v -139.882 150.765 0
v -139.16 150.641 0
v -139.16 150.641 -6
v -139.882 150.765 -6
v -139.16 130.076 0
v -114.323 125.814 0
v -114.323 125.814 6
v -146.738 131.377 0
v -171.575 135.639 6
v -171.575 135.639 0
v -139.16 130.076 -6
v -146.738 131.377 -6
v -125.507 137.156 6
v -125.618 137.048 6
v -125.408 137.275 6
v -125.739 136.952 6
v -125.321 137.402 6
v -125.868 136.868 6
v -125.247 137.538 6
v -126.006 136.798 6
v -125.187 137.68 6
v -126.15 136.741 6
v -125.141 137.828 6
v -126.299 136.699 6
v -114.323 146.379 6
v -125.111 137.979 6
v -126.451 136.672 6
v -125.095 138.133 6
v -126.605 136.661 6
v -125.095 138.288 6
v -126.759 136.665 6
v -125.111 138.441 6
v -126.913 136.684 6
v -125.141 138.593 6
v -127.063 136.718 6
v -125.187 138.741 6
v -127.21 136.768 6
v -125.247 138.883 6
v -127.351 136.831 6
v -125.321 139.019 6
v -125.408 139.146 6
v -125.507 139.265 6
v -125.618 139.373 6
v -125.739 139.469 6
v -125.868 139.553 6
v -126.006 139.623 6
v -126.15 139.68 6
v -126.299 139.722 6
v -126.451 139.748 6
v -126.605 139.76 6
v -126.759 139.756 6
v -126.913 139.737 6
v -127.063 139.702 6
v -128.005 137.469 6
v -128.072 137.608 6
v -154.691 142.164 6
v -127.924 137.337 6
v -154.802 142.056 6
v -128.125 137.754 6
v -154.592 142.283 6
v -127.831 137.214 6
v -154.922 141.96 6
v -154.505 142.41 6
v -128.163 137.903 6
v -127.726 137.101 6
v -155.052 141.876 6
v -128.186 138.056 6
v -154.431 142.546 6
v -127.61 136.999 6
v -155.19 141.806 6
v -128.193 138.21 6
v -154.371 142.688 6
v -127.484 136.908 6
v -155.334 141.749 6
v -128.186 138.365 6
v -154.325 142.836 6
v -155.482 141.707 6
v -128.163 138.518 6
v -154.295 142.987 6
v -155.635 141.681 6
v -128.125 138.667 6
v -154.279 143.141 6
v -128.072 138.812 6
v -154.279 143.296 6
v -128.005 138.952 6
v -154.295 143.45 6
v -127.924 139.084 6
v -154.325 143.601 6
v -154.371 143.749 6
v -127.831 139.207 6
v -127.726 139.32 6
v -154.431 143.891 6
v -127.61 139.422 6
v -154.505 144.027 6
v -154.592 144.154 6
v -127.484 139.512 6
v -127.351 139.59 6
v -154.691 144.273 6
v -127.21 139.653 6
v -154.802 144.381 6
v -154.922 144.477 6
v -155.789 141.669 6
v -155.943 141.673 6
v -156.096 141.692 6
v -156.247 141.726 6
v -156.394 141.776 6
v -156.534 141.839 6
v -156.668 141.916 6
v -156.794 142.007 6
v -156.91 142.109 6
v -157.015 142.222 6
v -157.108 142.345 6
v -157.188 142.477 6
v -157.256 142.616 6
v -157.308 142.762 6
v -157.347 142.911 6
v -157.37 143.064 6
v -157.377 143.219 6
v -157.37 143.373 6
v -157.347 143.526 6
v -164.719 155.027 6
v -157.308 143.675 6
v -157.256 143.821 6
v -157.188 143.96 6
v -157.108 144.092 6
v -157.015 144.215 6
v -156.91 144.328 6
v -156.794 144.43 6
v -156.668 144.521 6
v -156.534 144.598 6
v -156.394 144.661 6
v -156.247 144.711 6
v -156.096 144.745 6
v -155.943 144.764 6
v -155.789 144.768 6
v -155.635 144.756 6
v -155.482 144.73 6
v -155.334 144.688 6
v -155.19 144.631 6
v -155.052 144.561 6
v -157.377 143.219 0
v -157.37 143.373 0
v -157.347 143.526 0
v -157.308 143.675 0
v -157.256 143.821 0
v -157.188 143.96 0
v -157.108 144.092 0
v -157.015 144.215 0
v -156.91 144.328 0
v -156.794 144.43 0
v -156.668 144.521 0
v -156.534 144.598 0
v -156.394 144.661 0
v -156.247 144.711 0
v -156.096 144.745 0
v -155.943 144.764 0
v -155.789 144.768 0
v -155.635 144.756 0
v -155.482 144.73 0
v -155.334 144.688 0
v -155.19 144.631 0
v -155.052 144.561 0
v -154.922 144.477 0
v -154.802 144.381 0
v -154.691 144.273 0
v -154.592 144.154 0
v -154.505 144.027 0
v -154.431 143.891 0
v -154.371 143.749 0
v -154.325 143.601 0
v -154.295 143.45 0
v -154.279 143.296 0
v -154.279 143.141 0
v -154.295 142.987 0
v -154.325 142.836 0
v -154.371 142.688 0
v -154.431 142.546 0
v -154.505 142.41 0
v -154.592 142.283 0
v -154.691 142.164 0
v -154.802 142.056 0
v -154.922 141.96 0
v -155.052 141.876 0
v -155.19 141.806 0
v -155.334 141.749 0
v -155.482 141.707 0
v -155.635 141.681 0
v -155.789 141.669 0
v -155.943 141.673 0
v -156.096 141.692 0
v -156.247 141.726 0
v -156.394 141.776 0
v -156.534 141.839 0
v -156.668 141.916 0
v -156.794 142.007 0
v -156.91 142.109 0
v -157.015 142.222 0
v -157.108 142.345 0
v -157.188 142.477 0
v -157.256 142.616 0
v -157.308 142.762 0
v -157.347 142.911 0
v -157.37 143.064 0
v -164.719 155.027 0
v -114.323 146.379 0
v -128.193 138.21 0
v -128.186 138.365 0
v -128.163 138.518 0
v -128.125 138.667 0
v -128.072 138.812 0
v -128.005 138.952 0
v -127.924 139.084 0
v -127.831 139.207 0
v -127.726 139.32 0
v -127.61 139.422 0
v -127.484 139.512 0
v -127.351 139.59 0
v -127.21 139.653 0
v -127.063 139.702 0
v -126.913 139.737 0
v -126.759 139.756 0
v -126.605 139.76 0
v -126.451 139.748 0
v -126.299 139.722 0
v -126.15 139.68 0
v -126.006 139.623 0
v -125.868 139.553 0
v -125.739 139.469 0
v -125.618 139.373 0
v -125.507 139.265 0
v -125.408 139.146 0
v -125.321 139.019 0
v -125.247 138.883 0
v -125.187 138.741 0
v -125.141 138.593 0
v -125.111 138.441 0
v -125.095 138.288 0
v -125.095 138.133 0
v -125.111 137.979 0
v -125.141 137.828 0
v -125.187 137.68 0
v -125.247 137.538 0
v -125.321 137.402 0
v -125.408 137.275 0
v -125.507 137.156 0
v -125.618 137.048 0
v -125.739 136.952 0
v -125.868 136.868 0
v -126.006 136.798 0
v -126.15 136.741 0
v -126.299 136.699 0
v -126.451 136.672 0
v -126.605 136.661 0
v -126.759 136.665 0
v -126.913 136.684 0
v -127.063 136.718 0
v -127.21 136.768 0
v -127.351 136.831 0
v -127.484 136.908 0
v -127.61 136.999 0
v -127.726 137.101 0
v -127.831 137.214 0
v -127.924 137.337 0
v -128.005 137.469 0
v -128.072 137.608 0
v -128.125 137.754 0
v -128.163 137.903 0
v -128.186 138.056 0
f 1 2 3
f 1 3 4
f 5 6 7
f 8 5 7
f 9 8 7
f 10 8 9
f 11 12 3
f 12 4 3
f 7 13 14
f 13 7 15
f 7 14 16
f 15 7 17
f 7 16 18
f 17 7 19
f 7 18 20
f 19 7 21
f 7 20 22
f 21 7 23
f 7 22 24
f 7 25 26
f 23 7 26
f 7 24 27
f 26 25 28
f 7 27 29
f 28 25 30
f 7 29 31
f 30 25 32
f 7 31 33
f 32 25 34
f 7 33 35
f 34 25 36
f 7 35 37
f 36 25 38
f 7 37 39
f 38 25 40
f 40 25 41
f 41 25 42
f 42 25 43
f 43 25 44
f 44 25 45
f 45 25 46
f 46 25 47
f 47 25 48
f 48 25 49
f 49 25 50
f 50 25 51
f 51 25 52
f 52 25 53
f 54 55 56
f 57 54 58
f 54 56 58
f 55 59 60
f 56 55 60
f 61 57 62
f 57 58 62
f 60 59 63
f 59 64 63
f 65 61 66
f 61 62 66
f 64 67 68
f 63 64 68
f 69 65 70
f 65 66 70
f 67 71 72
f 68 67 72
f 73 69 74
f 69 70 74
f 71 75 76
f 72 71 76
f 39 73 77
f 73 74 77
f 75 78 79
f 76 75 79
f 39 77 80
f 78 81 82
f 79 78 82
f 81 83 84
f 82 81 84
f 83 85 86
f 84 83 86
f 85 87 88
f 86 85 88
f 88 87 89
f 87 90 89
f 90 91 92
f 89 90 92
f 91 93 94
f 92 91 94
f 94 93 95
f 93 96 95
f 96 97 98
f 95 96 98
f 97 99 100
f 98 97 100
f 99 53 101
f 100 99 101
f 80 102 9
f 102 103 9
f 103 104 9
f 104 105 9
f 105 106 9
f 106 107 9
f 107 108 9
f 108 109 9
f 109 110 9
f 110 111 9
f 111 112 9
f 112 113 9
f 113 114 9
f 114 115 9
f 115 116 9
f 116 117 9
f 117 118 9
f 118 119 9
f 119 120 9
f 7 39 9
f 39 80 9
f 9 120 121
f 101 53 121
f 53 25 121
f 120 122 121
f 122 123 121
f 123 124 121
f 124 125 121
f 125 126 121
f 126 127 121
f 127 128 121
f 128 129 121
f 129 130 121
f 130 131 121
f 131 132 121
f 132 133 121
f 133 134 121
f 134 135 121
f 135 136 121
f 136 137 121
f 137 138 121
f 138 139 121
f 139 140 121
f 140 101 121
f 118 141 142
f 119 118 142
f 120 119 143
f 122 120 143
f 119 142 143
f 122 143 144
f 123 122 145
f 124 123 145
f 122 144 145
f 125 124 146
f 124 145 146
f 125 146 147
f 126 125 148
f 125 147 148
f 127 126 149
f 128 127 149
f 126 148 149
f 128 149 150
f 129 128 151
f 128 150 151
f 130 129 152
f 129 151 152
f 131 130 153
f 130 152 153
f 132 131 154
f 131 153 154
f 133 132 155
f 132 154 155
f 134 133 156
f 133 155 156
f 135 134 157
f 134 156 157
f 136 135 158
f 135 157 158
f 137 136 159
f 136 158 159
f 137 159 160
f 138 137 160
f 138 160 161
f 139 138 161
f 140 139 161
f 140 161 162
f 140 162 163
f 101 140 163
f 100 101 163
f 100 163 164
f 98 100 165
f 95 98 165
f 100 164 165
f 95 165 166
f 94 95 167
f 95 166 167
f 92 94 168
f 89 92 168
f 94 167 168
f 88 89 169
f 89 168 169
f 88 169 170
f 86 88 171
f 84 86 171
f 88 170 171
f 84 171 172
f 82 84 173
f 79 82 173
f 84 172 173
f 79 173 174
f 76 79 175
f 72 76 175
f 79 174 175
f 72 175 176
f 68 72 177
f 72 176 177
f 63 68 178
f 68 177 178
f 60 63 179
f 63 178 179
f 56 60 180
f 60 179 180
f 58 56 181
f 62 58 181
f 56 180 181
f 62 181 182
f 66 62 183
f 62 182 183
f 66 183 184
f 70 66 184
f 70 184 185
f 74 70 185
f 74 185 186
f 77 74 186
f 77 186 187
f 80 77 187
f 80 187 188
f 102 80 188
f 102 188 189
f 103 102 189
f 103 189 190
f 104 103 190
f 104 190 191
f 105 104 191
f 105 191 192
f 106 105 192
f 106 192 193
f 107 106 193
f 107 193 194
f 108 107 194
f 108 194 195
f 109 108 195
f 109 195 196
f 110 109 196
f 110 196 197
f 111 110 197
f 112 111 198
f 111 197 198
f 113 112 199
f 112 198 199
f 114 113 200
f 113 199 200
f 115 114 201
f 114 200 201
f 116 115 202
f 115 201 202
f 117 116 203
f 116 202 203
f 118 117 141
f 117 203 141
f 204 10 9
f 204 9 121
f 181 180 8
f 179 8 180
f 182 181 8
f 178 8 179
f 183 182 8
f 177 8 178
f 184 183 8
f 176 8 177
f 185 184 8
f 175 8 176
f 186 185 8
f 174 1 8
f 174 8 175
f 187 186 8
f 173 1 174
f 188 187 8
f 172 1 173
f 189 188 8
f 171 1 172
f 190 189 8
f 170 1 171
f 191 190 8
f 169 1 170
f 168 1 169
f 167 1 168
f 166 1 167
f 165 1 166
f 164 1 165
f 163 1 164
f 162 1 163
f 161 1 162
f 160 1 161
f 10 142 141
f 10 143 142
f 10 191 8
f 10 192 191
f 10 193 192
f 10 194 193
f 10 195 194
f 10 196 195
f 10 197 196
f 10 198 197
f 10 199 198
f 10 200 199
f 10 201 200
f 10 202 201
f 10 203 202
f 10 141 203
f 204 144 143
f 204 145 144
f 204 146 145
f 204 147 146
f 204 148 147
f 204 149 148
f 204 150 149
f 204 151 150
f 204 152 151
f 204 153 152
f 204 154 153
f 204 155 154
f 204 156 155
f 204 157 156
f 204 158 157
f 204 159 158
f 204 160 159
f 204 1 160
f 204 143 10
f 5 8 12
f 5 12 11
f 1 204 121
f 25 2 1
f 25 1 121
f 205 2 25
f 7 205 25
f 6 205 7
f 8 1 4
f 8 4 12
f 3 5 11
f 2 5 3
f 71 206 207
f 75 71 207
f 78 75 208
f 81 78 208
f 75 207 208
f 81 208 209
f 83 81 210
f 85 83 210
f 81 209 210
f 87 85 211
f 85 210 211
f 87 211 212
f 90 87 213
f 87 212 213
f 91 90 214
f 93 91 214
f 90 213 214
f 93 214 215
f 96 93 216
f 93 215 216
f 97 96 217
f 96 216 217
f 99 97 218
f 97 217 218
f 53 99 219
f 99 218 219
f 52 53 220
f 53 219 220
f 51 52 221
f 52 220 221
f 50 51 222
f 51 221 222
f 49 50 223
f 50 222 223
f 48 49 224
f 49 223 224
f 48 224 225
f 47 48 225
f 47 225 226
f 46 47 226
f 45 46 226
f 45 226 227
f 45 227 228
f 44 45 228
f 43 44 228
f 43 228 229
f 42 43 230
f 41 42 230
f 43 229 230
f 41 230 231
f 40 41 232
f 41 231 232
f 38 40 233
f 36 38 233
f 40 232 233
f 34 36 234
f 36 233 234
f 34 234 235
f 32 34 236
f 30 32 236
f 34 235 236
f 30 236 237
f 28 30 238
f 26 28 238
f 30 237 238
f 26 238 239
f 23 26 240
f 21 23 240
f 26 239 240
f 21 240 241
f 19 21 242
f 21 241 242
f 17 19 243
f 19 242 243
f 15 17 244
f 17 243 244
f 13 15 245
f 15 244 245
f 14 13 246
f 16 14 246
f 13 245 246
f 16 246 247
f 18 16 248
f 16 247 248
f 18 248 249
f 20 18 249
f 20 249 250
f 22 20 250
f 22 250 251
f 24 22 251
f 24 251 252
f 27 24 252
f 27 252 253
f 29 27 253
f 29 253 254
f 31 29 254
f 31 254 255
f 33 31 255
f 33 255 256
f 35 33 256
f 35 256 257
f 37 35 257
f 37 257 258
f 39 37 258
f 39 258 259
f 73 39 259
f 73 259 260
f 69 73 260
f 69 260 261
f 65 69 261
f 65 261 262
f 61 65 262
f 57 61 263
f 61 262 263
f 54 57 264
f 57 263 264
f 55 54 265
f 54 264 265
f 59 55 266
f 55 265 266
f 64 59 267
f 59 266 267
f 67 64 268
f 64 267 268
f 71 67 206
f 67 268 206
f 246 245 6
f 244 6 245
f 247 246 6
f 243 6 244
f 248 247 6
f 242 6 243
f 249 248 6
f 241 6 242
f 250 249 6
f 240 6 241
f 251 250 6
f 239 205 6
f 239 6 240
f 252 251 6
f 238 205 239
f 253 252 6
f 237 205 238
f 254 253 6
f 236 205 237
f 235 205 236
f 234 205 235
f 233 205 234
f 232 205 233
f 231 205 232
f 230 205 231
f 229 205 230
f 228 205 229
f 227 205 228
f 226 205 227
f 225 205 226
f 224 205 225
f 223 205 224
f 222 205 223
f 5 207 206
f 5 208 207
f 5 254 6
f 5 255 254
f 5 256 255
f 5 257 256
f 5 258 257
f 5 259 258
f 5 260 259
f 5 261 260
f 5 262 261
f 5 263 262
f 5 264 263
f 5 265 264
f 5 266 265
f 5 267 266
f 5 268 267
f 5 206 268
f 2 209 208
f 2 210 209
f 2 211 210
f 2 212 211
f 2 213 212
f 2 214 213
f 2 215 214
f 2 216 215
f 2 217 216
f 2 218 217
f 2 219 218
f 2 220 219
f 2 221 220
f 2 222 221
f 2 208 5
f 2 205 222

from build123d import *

# Parameters (mm, degrees)
EXTRUDE_1_DEPTH     = 6
EXTRUDE_2_DEPTH     = 6
SKETCH_3_R          = 1.55
CUT_EXTRUDE_1_DEPTH = 6


with BuildPart() as part:
    # Эскиз1 → Бобышка-Вытянуть1 (new body)
    with BuildSketch(Plane.XY):
        Polygon((-114.323496858, 125.813994573), (-171.575189585, 135.638663443), (-164.719145048, 155.026651824), (-114.323496858, 146.378513535), align=None)
    extrude(amount=EXTRUDE_1_DEPTH)

    # Эскиз2 → Бобышка-Вытянуть2 (add)
    with BuildSketch(Plane(origin=(0, 0, 0), x_dir=(-1, 0, 0), z_dir=(0, 0, -1))):
        Polygon((146.738238306, 131.376521829), (139.160448137, 130.076136187), (139.160448137, 150.64065515), (139.882193768, 150.76451021), align=None)
    extrude(amount=EXTRUDE_2_DEPTH)

    # Эскиз3 → Вырез-Вытянуть1 (cut)
    with BuildSketch(Plane(origin=(0, 0, 0), x_dir=(-1, 0, 0), z_dir=(0, 0, -1))):
        with Locations((126.643413167, 138.210411601)):
            Circle(SKETCH_3_R)
        with Locations((155.827251007, 143.218500087)):
            Circle(SKETCH_3_R)
    extrude(amount=-CUT_EXTRUDE_1_DEPTH, mode=Mode.SUBTRACT)


solid = part.part
